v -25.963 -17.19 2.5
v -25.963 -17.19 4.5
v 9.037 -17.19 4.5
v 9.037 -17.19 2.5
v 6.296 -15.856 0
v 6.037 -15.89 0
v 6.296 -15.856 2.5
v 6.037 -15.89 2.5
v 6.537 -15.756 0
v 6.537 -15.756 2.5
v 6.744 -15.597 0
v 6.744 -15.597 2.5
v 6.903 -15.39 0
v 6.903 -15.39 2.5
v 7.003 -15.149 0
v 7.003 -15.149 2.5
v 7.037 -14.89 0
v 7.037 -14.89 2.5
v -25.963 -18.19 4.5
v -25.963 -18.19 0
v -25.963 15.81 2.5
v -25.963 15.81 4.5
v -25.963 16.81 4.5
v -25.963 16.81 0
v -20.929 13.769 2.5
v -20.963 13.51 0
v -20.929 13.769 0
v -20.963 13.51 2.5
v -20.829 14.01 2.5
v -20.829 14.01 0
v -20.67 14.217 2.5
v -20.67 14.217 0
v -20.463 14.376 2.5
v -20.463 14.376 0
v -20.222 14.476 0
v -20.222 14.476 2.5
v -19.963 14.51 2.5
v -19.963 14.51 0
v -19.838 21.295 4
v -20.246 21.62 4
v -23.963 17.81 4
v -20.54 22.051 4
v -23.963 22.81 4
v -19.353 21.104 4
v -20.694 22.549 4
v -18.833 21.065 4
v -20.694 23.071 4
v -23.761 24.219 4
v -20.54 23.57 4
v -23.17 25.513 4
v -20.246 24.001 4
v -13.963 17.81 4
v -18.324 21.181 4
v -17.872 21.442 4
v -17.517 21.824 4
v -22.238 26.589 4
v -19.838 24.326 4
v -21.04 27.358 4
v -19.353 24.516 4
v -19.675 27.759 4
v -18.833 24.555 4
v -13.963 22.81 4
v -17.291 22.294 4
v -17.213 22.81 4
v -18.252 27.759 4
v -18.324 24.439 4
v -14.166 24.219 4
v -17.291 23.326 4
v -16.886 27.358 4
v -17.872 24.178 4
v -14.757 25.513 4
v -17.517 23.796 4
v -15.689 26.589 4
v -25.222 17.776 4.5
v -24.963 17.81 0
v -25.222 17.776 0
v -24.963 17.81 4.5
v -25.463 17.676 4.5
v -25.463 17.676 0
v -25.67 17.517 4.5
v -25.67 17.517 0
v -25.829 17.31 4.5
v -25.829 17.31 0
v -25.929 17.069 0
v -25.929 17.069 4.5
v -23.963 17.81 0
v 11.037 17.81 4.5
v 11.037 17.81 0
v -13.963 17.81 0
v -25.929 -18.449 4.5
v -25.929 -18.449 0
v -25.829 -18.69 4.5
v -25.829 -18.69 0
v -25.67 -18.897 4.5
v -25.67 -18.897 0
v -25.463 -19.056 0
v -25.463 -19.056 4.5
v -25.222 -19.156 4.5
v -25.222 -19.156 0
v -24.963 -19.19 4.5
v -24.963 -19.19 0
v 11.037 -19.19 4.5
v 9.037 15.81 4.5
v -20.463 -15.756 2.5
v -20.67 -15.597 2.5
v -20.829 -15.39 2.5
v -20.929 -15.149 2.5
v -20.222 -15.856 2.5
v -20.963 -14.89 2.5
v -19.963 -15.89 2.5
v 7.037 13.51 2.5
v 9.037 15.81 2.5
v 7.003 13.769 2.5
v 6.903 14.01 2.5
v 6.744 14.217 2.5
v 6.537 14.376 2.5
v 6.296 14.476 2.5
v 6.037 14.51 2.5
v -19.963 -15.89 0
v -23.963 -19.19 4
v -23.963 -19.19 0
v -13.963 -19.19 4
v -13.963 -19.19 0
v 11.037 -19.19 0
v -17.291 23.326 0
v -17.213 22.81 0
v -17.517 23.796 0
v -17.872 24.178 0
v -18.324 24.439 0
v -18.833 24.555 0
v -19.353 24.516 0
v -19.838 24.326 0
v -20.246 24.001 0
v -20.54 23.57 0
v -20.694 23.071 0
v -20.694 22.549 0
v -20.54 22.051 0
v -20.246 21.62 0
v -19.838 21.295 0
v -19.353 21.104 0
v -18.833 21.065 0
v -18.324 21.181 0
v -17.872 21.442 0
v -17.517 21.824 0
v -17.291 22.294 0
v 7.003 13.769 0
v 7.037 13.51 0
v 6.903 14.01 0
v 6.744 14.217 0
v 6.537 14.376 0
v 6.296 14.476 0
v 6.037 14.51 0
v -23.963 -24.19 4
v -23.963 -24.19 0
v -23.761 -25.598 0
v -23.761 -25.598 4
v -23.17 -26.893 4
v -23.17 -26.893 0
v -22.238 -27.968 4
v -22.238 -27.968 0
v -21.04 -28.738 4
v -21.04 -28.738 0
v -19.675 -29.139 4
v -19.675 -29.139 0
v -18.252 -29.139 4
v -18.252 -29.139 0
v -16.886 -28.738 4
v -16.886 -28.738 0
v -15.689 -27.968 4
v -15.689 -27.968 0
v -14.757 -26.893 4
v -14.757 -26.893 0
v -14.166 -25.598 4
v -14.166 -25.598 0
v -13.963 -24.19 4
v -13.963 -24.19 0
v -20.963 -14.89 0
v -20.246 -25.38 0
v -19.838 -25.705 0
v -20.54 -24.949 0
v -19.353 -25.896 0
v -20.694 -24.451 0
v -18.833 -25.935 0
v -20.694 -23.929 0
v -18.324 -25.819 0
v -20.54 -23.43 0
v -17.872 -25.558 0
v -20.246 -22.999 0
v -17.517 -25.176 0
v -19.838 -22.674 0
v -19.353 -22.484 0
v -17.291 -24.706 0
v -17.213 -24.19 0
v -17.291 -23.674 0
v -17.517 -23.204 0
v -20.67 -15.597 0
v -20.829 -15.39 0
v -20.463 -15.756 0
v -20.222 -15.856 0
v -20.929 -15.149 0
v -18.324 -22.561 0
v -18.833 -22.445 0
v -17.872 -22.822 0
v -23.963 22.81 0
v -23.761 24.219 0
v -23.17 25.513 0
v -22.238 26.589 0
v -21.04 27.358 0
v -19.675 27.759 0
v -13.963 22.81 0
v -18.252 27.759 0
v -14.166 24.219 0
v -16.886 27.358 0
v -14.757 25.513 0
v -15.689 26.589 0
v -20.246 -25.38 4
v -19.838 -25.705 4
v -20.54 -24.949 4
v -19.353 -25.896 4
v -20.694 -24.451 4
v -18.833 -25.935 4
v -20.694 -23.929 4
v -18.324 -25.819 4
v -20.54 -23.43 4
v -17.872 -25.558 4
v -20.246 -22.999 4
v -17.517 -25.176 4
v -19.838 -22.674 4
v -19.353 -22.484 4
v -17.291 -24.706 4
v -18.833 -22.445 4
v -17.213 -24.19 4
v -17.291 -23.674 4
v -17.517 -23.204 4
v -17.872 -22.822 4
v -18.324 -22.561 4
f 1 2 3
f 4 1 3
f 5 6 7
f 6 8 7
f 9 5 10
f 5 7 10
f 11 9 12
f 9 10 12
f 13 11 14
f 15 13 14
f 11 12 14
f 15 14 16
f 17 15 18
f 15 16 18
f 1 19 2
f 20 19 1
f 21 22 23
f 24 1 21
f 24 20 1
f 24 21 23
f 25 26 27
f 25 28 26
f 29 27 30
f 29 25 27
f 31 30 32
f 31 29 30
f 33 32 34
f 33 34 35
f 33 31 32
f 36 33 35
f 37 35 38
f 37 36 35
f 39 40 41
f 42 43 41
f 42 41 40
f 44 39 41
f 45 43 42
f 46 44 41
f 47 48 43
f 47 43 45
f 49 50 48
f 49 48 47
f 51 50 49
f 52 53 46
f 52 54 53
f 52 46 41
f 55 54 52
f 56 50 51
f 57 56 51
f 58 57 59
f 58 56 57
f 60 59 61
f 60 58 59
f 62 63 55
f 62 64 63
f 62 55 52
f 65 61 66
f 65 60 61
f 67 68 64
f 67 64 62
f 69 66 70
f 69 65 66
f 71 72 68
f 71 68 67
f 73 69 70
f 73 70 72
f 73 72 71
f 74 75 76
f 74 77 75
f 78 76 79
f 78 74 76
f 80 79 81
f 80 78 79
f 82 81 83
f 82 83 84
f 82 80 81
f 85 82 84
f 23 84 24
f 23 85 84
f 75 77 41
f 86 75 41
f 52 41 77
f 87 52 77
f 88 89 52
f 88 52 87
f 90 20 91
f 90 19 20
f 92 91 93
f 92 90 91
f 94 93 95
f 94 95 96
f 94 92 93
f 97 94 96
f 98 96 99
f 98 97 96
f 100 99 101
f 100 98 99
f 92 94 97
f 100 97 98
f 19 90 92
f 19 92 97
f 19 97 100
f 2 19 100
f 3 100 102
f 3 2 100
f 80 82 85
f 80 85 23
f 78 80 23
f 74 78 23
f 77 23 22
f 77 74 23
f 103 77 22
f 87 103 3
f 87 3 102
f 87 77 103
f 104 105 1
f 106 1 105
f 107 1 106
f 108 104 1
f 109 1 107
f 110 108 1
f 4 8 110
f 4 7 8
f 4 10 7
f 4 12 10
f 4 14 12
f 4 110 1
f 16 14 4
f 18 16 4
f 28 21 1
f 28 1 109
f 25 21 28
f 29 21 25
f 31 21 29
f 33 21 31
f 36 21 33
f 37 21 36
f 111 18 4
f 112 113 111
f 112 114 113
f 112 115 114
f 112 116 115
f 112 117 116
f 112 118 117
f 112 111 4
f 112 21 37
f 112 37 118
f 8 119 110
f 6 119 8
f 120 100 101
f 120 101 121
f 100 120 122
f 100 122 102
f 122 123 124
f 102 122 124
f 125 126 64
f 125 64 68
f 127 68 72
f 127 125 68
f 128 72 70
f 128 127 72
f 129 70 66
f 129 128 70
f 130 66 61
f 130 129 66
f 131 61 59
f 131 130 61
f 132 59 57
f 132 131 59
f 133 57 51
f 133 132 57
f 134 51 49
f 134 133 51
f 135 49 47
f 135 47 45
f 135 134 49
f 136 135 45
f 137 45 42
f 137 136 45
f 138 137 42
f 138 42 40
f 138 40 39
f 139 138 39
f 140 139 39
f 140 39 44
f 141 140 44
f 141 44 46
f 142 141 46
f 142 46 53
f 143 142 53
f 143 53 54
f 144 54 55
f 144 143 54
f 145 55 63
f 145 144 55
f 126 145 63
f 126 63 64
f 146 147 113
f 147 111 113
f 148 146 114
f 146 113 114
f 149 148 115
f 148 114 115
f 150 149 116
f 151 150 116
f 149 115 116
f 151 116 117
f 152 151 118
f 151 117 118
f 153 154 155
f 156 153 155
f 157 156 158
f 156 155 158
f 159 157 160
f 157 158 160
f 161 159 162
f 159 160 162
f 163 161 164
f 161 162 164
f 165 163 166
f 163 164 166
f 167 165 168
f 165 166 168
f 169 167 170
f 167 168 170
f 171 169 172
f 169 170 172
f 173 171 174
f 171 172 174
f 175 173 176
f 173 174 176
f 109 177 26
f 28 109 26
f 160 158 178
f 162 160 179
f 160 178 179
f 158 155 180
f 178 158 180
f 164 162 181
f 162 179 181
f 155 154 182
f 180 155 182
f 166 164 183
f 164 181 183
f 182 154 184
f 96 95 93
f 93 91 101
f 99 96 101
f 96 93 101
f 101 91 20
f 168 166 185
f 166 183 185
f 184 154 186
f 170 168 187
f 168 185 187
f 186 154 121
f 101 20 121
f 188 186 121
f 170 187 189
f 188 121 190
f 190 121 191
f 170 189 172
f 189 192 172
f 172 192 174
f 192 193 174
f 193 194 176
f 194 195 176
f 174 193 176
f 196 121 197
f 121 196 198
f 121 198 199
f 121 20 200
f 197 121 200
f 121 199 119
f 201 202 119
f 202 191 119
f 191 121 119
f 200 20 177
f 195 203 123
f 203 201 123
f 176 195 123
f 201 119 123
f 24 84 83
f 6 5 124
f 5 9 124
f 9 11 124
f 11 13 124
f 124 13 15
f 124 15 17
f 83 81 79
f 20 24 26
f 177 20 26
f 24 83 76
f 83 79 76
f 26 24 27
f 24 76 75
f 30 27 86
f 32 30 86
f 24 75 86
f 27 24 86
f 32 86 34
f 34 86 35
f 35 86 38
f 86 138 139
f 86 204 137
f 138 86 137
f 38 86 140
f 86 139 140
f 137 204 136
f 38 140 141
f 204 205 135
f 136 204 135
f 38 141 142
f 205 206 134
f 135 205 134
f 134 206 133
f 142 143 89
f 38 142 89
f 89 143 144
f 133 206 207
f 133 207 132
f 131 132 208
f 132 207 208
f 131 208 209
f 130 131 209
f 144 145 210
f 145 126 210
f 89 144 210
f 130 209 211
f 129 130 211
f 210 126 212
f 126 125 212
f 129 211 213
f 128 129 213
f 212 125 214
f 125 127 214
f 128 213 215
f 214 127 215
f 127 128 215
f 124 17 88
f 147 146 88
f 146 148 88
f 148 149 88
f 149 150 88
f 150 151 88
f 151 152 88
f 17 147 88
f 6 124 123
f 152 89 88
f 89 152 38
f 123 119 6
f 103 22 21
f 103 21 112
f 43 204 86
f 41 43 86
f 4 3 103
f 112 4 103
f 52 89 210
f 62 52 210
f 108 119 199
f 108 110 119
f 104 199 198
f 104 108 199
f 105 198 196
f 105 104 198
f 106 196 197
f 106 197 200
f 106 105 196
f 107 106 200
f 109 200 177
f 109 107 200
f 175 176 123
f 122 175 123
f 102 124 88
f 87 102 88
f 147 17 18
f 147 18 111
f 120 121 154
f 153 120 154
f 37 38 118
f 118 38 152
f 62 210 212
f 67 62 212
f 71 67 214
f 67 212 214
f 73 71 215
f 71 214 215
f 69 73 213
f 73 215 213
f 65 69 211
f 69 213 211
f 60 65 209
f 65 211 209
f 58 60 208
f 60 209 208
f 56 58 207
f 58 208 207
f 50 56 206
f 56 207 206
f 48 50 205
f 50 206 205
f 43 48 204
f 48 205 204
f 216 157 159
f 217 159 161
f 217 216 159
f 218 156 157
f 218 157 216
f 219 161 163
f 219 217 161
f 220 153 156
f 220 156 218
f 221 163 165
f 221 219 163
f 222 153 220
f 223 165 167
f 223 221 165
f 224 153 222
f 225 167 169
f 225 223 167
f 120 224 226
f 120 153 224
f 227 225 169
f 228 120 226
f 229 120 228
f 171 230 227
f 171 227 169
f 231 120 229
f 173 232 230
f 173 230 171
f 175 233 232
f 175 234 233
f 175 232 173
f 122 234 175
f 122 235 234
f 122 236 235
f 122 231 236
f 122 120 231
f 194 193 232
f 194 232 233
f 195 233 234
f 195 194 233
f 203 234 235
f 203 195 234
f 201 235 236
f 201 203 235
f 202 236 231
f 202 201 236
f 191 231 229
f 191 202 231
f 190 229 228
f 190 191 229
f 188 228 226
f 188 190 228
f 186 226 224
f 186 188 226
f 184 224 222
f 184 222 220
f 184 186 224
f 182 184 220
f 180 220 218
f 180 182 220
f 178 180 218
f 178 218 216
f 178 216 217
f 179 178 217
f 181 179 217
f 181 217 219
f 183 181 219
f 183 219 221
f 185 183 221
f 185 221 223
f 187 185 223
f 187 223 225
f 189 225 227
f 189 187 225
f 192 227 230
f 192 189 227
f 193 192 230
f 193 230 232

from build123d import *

# Parameters (mm, degrees)
F0_W     = 37
F0_H     = 37
F0_W_2   = 28
F0_H_2   = 30.4
F1_DEPTH = 4.5
F2_W     = 35
F2_H     = 33
F3_DEPTH = 2
F4_R     = 1.75
F5_DEPTH = 4
F6_DEPTH = 4
F7_R     = 1


with BuildPart() as f1:
    # F0 (on Top) → F1 (new body)
    with BuildSketch(Plane.XY):
        with Locations((-7.463294, -0.689729)):
            Rectangle(F0_W, F0_H)
        with Locations((-6.963294, -0.689729)):
            Rectangle(F0_W_2, F0_H_2, mode=Mode.SUBTRACT)
    extrude(amount=F1_DEPTH)

    # F2 (on face) → F3 (cut)
    with BuildSketch(Plane.XY.offset(4.5)):
        with Locations((-8.463294, -0.689729)):
            Rectangle(F2_W, F2_H)
    extrude(amount=-F3_DEPTH, mode=Mode.SUBTRACT)

    # F4 (on Top) → F5 (join)
    with BuildSketch(Plane.XY):
        with BuildLine():
            Line((-13.963294, 17.810271), (-13.963294, 22.810271))
            ThreePointArc((-13.963294, 22.810271), (-18.963294, 27.810271), (-23.963294, 22.810271))
            Line((-23.963294, 22.810271), (-23.963294, 17.810271))
            Line((-23.963294, 17.810271), (-13.963294, 17.810271))
        make_face()
        with Locations((-18.963294, 22.810271)):
            Circle(F4_R, mode=Mode.SUBTRACT)
        with BuildLine():
            Line((-23.963294, -19.189729), (-23.963294, -24.189729))
            ThreePointArc((-23.963294, -24.189729), (-18.963294, -29.189729), (-13.963294, -24.189729))
            Line((-13.963294, -24.189729), (-13.963294, -19.189729))
            Line((-13.963294, -19.189729), (-23.963294, -19.189729))
        make_face()
        with Locations((-18.963294, -24.189729)):
            Circle(F4_R, mode=Mode.SUBTRACT)
    extrude(amount=F5_DEPTH)

    # F4 (on Top) → F6 (join)
    with BuildSketch(Plane.XY):
        with BuildLine():
            Line((-13.963294, 17.810271), (-13.963294, 22.810271))
            ThreePointArc((-13.963294, 22.810271), (-18.963294, 27.810271), (-23.963294, 22.810271))
            Line((-23.963294, 22.810271), (-23.963294, 17.810271))
            Line((-23.963294, 17.810271), (-13.963294, 17.810271))
        make_face()
        with Locations((-18.963294, 22.810271)):
            Circle(F4_R, mode=Mode.SUBTRACT)
        with BuildLine():
            Line((-23.963294, -19.189729), (-23.963294, -24.189729))
            ThreePointArc((-23.963294, -24.189729), (-18.963294, -29.189729), (-13.963294, -24.189729))
            Line((-13.963294, -24.189729), (-13.963294, -19.189729))
            Line((-13.963294, -19.189729), (-23.963294, -19.189729))
        make_face()
        with Locations((-18.963294, -24.189729)):
            Circle(F4_R, mode=Mode.SUBTRACT)
    extrude(amount=F6_DEPTH)

    # F7
    f7_edges = [f1.edges().sort_by_distance(p)[0] for p in [
        (7.036706, 14.510271, 1.25),
        (-20.963294, 14.510271, 1.25),
        (-20.963294, -15.889729, 1.25),
        (7.036706, -15.889729, 1.25),
        (-25.963294, -19.189729, 2.25),
        (-25.963294, 17.810271, 2.25),
    ]]
    fillet(f7_edges, radius=F7_R)


solid = f1.part
